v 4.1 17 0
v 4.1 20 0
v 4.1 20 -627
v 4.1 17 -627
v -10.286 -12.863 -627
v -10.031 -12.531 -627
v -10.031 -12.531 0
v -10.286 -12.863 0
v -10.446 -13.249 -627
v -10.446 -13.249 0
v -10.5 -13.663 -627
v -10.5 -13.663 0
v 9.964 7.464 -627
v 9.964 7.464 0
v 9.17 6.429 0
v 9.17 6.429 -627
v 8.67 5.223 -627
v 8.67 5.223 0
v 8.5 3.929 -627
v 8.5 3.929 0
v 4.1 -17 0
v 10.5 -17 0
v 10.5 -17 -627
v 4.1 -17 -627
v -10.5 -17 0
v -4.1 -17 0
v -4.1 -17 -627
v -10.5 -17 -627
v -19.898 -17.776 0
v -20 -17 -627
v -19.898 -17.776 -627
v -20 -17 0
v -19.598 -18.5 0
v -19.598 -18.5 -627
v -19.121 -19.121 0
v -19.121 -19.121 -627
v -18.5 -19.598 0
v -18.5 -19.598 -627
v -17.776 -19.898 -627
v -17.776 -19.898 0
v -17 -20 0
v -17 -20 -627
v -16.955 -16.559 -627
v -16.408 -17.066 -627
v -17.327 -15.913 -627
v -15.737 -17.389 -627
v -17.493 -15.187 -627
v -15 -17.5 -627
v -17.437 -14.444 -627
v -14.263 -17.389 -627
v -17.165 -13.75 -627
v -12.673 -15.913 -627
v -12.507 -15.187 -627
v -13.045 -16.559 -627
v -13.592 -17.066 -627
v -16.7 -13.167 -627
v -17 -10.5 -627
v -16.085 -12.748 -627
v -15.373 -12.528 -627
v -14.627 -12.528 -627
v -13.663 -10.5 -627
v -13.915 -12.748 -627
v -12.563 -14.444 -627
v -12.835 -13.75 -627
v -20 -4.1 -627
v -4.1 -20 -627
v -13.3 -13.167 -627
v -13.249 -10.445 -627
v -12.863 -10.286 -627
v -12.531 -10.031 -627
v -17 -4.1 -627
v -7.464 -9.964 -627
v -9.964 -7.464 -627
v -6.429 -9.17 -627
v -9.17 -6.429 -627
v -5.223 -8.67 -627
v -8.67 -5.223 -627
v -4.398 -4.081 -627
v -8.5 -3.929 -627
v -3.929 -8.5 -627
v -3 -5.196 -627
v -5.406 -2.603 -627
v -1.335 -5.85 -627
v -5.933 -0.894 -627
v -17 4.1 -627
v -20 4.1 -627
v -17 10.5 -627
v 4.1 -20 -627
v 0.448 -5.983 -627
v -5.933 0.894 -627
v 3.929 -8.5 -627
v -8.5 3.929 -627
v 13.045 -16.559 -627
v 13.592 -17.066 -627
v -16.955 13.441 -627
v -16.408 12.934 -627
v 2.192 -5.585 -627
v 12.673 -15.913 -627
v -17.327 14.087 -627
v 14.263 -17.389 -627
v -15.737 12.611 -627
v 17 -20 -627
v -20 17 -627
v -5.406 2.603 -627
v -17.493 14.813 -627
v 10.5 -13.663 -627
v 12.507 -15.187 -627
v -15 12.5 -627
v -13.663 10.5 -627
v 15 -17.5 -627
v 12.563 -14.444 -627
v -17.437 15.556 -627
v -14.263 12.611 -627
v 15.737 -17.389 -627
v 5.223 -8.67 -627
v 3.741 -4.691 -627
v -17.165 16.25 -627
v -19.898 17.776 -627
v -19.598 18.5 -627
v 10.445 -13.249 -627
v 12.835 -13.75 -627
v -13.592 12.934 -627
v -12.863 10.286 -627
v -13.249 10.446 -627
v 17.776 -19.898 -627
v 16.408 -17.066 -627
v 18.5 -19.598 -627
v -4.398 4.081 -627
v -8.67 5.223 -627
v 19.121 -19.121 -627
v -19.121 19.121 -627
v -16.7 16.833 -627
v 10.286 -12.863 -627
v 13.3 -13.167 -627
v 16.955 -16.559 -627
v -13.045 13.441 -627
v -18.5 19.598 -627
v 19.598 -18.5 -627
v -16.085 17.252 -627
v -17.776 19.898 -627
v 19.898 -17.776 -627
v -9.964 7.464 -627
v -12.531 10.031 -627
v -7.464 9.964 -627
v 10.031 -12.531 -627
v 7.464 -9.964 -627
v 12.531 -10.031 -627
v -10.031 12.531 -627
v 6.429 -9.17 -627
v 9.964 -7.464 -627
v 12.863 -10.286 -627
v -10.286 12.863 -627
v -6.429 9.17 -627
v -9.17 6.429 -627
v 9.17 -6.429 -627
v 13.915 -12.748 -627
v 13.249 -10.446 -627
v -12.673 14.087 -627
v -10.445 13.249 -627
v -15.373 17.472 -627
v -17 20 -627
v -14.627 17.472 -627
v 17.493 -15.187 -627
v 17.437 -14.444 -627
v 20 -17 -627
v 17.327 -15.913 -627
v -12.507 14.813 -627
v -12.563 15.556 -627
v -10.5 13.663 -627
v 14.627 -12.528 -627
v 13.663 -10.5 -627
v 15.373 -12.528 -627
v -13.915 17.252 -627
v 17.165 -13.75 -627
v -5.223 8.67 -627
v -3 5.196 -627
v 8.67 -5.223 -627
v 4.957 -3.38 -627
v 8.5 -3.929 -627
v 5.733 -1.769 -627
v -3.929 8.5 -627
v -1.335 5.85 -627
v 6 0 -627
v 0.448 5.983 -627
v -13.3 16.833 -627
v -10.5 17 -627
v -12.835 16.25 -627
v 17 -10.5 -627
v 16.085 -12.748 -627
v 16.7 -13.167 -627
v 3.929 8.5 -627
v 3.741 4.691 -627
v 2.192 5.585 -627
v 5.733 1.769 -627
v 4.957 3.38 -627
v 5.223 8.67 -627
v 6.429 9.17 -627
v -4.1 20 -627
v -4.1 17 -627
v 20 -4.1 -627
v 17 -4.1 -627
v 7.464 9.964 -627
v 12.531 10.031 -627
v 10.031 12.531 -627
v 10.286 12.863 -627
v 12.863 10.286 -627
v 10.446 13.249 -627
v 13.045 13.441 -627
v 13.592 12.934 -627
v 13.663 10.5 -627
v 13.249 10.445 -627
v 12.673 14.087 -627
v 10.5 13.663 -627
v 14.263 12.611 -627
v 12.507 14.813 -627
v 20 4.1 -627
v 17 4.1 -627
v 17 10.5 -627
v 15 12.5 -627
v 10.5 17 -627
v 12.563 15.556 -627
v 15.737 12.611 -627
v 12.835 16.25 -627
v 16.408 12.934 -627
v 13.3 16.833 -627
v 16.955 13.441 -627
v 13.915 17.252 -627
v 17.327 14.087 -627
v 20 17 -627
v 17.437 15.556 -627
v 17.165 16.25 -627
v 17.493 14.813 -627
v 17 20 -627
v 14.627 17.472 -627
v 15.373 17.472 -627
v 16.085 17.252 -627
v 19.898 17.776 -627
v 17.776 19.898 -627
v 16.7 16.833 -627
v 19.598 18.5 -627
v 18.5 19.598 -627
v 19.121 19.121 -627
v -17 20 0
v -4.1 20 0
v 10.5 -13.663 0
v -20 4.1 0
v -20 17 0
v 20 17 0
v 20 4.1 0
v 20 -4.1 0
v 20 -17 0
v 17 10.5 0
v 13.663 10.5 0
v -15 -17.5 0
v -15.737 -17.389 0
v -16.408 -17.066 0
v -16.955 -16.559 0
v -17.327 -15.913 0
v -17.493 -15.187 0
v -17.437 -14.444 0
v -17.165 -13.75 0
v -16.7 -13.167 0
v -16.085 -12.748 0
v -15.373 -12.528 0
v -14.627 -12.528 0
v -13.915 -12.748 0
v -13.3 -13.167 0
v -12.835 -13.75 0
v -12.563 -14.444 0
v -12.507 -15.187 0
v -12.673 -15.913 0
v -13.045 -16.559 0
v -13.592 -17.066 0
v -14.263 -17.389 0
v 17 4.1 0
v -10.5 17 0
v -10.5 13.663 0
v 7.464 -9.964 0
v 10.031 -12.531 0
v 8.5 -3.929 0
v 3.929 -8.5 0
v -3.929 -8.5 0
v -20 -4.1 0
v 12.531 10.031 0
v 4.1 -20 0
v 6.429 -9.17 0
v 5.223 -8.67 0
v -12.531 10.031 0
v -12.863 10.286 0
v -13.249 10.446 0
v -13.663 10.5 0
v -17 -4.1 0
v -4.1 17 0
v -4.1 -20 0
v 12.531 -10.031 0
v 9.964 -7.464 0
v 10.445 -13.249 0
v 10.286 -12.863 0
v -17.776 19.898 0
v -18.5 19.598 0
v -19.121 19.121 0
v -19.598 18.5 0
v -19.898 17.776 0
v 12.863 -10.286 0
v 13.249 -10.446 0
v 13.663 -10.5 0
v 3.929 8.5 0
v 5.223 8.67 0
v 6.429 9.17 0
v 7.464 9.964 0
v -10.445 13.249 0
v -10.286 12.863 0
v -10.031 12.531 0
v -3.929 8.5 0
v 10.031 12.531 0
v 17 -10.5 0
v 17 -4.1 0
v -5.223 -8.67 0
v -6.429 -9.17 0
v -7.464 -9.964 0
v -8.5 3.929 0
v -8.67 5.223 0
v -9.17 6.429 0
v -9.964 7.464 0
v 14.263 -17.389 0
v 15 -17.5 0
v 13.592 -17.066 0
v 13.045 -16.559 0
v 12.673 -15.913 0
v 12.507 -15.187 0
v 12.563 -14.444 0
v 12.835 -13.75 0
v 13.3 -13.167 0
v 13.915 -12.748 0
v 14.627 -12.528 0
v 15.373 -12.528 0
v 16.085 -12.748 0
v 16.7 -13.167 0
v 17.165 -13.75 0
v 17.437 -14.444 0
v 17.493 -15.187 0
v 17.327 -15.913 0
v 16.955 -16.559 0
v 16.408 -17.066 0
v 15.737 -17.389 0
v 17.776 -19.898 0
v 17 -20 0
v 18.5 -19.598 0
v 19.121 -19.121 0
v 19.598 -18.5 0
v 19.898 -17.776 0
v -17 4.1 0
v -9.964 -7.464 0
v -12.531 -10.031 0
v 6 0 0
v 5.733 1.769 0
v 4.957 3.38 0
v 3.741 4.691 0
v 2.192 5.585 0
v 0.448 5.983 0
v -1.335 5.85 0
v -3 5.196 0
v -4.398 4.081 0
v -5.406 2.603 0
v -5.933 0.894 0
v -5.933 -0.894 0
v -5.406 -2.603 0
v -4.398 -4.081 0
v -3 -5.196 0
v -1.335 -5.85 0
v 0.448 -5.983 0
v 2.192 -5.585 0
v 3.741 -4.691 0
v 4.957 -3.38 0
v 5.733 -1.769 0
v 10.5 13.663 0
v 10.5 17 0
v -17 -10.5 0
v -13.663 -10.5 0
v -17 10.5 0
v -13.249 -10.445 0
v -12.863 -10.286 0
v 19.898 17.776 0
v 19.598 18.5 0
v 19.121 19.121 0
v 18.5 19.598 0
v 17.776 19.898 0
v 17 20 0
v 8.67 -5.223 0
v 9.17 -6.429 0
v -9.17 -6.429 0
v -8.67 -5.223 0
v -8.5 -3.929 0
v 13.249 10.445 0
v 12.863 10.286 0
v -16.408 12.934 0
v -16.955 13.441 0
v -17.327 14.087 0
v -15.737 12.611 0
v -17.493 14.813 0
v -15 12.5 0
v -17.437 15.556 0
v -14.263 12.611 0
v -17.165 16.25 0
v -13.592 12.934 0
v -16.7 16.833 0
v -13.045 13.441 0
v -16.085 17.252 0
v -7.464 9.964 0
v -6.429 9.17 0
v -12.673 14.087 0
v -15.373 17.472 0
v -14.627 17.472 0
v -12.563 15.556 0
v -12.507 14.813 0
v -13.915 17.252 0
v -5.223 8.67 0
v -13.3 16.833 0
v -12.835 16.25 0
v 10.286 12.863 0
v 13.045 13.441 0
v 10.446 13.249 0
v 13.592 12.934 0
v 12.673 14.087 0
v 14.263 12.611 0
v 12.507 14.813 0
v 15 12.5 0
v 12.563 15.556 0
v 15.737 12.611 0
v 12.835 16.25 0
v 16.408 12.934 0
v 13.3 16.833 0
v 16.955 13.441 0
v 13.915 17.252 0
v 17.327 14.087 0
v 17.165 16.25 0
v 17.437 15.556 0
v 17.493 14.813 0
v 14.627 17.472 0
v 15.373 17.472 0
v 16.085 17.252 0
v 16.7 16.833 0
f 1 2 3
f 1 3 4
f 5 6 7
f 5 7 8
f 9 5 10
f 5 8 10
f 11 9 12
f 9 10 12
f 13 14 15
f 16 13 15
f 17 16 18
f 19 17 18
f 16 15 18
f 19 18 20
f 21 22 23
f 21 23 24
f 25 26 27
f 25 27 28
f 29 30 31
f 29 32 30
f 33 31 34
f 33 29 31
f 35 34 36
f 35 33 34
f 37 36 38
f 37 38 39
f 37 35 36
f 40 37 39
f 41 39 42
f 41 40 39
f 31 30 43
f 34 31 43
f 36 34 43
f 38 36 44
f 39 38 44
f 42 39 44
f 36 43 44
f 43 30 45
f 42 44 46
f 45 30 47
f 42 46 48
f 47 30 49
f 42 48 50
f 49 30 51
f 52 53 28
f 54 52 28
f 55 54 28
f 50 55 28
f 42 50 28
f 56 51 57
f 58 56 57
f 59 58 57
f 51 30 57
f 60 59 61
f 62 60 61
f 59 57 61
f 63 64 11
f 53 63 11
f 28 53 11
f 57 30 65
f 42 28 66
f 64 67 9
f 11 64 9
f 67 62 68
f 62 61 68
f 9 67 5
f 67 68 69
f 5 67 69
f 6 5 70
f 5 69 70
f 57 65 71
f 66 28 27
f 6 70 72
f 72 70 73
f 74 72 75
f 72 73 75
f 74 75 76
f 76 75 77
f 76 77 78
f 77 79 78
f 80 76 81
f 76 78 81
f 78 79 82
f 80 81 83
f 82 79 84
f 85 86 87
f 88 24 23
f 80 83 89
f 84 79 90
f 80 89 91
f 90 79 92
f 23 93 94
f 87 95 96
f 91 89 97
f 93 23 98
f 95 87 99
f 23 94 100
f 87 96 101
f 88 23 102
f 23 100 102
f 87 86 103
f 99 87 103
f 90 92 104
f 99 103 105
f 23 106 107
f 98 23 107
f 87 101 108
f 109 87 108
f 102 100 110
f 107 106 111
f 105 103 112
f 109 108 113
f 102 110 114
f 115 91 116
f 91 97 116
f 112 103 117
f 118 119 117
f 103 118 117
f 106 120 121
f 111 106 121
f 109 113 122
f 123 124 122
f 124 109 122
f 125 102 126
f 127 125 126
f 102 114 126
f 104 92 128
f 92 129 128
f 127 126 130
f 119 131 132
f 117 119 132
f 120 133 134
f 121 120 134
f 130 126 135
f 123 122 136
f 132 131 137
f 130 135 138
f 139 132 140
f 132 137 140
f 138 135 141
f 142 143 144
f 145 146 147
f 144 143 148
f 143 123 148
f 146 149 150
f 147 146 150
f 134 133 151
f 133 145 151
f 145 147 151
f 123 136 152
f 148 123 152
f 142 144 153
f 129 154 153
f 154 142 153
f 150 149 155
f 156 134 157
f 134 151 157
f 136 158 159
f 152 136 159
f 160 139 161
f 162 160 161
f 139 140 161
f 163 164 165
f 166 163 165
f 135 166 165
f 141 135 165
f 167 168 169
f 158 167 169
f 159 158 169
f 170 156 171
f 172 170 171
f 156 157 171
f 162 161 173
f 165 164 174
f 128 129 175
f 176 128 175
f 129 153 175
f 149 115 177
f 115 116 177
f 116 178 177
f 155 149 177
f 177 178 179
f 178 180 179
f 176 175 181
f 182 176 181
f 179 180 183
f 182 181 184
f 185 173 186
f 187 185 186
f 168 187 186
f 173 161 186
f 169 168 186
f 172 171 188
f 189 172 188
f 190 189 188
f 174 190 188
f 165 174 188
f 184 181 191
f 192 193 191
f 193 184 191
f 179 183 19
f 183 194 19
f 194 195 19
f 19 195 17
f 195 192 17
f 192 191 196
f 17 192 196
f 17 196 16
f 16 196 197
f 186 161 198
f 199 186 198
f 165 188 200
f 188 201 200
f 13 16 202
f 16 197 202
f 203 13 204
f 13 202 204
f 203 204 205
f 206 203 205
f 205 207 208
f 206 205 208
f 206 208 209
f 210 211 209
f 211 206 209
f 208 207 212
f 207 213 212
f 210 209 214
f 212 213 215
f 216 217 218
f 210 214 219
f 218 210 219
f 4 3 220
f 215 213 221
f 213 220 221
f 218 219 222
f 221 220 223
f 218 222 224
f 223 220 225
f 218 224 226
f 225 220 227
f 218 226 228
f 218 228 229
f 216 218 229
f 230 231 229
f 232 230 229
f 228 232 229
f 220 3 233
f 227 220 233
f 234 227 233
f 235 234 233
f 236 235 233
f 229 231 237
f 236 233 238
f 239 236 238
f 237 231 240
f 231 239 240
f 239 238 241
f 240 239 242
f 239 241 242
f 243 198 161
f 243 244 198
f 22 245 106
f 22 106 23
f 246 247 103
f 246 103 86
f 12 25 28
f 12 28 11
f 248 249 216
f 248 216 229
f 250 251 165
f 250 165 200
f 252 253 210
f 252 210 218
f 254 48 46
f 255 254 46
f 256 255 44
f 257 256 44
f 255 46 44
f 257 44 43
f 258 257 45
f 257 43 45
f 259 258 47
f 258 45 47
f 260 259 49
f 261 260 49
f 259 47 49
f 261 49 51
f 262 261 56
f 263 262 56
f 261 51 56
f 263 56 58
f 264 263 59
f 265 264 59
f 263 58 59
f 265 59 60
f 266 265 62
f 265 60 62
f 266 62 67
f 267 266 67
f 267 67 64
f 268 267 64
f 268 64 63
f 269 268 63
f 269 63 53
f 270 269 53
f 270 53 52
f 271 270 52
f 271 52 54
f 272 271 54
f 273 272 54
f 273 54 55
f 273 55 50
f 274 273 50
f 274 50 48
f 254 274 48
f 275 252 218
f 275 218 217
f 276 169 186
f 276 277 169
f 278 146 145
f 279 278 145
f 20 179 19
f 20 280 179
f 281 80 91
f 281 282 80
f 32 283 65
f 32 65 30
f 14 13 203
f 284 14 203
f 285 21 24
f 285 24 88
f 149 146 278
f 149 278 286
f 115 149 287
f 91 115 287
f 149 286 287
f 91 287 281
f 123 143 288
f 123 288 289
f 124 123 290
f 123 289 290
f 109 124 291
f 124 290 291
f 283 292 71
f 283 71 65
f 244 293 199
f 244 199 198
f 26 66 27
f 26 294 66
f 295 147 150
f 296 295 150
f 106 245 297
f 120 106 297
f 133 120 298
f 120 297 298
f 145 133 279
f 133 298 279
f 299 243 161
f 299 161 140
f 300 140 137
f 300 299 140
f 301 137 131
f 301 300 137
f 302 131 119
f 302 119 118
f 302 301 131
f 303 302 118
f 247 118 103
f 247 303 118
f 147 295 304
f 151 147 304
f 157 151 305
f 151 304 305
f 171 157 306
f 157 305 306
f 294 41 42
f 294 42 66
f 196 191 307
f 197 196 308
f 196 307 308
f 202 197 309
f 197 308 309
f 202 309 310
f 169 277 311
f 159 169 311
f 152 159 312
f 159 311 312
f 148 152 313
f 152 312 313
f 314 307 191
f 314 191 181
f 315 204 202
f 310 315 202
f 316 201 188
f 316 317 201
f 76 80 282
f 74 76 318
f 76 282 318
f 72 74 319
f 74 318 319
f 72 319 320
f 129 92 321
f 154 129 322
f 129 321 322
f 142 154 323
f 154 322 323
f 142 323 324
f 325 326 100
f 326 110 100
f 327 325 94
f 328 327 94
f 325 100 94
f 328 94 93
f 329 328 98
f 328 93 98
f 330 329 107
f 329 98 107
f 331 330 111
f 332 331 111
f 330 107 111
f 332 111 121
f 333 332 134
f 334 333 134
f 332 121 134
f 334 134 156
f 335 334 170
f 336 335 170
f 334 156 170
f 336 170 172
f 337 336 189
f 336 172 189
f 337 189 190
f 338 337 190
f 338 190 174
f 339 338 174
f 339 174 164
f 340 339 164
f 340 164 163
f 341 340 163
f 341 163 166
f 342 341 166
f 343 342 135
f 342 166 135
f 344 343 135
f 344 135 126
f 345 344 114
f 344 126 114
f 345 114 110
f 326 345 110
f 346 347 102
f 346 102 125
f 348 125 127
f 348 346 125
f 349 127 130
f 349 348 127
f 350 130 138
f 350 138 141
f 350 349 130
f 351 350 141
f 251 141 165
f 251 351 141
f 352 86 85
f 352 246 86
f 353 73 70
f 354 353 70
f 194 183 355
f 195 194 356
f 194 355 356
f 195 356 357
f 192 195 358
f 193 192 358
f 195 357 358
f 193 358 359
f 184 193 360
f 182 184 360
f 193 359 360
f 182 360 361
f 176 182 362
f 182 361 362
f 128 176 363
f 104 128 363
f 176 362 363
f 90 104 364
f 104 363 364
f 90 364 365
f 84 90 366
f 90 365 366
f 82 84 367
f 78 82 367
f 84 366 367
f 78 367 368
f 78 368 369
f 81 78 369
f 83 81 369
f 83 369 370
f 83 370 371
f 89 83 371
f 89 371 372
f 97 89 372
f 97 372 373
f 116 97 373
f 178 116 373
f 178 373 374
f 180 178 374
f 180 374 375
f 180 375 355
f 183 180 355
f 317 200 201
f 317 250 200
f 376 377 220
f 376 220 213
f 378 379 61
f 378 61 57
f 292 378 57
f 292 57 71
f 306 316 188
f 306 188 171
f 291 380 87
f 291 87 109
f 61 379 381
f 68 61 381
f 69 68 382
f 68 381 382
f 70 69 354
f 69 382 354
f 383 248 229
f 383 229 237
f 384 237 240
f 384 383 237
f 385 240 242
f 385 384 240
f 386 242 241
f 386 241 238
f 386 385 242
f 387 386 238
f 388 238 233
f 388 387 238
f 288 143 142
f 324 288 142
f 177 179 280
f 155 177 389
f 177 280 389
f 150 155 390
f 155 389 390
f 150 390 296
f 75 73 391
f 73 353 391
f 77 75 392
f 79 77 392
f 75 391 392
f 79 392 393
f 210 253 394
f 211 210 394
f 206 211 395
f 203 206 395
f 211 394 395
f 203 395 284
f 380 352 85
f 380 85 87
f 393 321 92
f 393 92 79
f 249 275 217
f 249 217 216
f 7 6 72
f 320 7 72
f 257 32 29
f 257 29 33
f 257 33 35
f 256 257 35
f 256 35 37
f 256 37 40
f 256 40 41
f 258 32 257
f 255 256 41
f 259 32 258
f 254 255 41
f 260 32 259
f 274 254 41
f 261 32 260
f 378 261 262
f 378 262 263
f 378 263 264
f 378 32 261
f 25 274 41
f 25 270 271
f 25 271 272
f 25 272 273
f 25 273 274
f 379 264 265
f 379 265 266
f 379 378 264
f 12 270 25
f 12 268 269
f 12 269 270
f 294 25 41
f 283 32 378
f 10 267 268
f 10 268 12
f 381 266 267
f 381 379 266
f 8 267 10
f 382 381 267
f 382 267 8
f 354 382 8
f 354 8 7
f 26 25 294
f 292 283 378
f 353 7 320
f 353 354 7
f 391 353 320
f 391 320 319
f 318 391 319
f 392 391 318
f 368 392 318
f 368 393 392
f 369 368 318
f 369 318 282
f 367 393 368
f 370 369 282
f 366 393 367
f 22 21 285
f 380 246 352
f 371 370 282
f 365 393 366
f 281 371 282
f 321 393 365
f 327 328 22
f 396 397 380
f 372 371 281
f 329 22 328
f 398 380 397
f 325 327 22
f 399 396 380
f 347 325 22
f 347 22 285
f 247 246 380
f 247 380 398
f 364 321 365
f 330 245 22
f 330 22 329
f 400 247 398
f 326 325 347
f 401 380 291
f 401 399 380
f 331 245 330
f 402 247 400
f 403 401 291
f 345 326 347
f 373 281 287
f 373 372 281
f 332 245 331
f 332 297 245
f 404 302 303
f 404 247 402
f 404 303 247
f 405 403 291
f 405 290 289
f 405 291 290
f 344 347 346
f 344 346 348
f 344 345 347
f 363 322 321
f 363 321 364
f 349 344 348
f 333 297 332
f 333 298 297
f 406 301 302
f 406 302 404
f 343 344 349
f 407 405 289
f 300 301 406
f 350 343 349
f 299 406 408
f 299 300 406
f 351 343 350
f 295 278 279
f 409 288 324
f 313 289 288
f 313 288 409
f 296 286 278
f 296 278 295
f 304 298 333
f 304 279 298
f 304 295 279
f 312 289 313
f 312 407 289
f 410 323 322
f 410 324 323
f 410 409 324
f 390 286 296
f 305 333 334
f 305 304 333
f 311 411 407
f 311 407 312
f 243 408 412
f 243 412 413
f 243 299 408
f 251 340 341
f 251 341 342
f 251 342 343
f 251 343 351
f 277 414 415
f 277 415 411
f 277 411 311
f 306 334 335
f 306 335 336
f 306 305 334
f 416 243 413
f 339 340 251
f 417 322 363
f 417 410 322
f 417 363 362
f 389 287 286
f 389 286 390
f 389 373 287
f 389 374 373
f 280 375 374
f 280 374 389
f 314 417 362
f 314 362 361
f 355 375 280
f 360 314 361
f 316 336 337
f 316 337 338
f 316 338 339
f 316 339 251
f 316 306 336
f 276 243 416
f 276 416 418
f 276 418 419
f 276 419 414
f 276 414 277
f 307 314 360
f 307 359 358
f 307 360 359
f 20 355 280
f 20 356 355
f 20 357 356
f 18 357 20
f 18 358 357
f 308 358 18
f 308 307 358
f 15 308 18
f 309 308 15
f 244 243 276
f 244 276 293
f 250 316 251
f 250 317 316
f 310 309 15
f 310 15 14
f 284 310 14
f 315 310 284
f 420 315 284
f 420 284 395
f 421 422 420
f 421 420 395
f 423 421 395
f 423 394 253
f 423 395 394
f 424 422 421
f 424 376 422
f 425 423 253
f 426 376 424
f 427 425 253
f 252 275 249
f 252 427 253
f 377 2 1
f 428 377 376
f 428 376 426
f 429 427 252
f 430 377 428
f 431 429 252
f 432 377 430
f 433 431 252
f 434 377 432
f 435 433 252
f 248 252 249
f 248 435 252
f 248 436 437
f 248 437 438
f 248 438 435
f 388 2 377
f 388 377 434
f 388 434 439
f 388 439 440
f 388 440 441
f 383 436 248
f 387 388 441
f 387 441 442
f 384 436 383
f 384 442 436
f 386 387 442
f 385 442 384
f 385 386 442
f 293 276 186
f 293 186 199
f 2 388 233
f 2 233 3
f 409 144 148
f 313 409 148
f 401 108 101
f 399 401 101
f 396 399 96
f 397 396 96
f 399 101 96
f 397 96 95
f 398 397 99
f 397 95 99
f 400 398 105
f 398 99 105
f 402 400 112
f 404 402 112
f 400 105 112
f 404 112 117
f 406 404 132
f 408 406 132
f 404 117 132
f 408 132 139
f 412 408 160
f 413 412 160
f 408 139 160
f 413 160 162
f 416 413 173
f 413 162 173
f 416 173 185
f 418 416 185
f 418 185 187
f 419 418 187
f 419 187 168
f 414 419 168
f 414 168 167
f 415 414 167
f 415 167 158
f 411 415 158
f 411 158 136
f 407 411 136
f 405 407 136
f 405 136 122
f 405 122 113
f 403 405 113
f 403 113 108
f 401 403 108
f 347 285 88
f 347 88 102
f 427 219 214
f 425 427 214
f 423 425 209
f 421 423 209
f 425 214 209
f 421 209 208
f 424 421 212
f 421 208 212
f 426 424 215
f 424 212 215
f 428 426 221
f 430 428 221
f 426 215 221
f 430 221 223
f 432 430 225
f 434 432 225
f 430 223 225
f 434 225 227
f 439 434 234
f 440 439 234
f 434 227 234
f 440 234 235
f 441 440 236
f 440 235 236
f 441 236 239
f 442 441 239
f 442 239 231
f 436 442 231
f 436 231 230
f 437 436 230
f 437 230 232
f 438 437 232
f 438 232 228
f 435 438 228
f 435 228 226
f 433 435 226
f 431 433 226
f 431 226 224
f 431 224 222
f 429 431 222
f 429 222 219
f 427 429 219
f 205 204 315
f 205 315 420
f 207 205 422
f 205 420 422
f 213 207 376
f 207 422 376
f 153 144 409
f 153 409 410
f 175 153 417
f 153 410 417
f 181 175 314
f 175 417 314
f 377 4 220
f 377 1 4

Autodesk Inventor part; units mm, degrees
sketch "Skizze_1" plane through (0, 0, 0) normal (0, 0, 1) x (1, 0, 0)
  arc A0 (-20, -17) -> (-17, -20) centre (-17, -17) ccw
  line L0 (-17, -20) -> (-4.1, -20)
  line L1 (-4.1, -20) -> (-4.1, -17)
  line L2 (-4.1, -17) -> (-10.5, -17)
  line L3 (-10.5, -17) -> (-10.5, -13.6627)
  arc A1 (-10.0314, -12.5314) -> (-10.5, -13.6627) centre (-8.9002, -13.6627) ccw
  line L4 (-10.0314, -12.5314) -> (-7.4645, -9.9645)
  arc A2 (-3.9289, -8.5) -> (-7.4645, -9.9645) centre (-3.9289, -13.5) ccw
  line L5 (-3.9289, -8.5) -> (3.9289, -8.5)
  arc A3 (7.4645, -9.9645) -> (3.9289, -8.5) centre (3.9289, -13.5) ccw
  line L6 (7.4645, -9.9645) -> (10.0314, -12.5314)
  arc A4 (10.5, -13.6627) -> (10.0314, -12.5314) centre (8.9002, -13.6627) ccw
  line L7 (10.5, -13.6627) -> (10.5, -17)
  line L8 (10.5, -17) -> (4.1, -17)
  line L9 (4.1, -17) -> (4.1, -20)
  line L10 (4.1, -20) -> (17, -20)
  arc A5 (17, -20) -> (20, -17) centre (17, -17) ccw
  line L11 (20, -17) -> (20, -4.1)
  line L12 (20, -4.1) -> (17, -4.1)
  line L13 (17, -4.1) -> (17, -10.5)
  line L14 (17, -10.5) -> (13.6627, -10.5)
  arc A6 (12.5314, -10.0314) -> (13.6627, -10.5) centre (13.6627, -8.9002) ccw
  line L15 (12.5314, -10.0314) -> (9.9645, -7.4645)
  arc A7 (8.5, -3.9289) -> (9.9645, -7.4645) centre (13.5, -3.9289) ccw
  line L16 (8.5, -3.9289) -> (8.5, 3.9289)
  arc A8 (9.9645, 7.4645) -> (8.5, 3.9289) centre (13.5, 3.9289) ccw
  line L17 (9.9645, 7.4645) -> (12.5314, 10.0314)
  arc A9 (13.6627, 10.5) -> (12.5314, 10.0314) centre (13.6627, 8.9002) ccw
  line L18 (13.6627, 10.5) -> (17, 10.5)
  line L19 (17, 10.5) -> (17, 4.1)
  line L20 (17, 4.1) -> (20, 4.1)
  line L21 (20, 4.1) -> (20, 17)
  arc A10 (20, 17) -> (17, 20) centre (17, 17) ccw
  line L22 (17, 20) -> (4.1, 20)
  line L23 (4.1, 20) -> (4.1, 17)
  line L24 (4.1, 17) -> (10.5, 17)
  line L25 (10.5, 17) -> (10.5, 13.6627)
  arc A11 (10.0314, 12.5314) -> (10.5, 13.6627) centre (8.9002, 13.6627) ccw
  line L26 (10.0314, 12.5314) -> (7.4645, 9.9645)
  arc A12 (3.9289, 8.5) -> (7.4645, 9.9645) centre (3.9289, 13.5) ccw
  line L27 (3.9289, 8.5) -> (-3.9289, 8.5)
  arc A13 (-7.4645, 9.9645) -> (-3.9289, 8.5) centre (-3.9289, 13.5) ccw
  line L28 (-7.4645, 9.9645) -> (-10.0314, 12.5314)
  arc A14 (-10.5, 13.6627) -> (-10.0314, 12.5314) centre (-8.9002, 13.6627) ccw
  line L29 (-10.5, 13.6627) -> (-10.5, 17)
  line L30 (-10.5, 17) -> (-4.1, 17)
  line L31 (-4.1, 17) -> (-4.1, 20)
  line L32 (-4.1, 20) -> (-17, 20)
  arc A15 (-17, 20) -> (-20, 17) centre (-17, 17) ccw
  line L33 (-20, 17) -> (-20, 4.1)
  line L34 (-20, 4.1) -> (-17, 4.1)
  line L35 (-17, 4.1) -> (-17, 10.5)
  line L36 (-17, 10.5) -> (-13.6627, 10.5)
  arc A16 (-12.5314, 10.0314) -> (-13.6627, 10.5) centre (-13.6627, 8.9002) ccw
  line L37 (-12.5314, 10.0314) -> (-9.9645, 7.4645)
  arc A17 (-8.5, 3.9289) -> (-9.9645, 7.4645) centre (-13.5, 3.9289) ccw
  line L38 (-8.5, 3.9289) -> (-8.5, -3.9289)
  arc A18 (-9.9645, -7.4645) -> (-8.5, -3.9289) centre (-13.5, -3.9289) ccw
  line L39 (-9.9645, -7.4645) -> (-12.5314, -10.0314)
  arc A19 (-13.6627, -10.5) -> (-12.5314, -10.0314) centre (-13.6627, -8.9002) ccw
  line L40 (-13.6627, -10.5) -> (-17, -10.5)
  line L41 (-17, -10.5) -> (-17, -4.1)
  line L42 (-17, -4.1) -> (-20, -4.1)
  line L43 (-20, -4.1) -> (-20, -17)
  circle A20 centre (0, 0) radius 6
extrude "Extrusion1" add sketch "Skizze_1" against normal blind 627
sketch "Sketch2" plane through (0, 0, 0) normal (0, 0, 1) x (1, 0, 0)
  point P0 (-15, -15)
hole "Drilling 1" at (-15, -15, 0) direction (0, 0, -1) diameter 5 depth 6000
sketch "Sketch3" plane through (0, 0, 0) normal (0, 0, 1) x (1, 0, 0)
  point P0 (15, -15)
hole "Drilling 2" at (15, -15, 0) direction (0, 0, -1) diameter 5 depth 6000
sketch "Sketch4" plane through (0, 0, 0) normal (0, 0, 1) x (1, 0, 0)
  point P0 (15, 15)
hole "Drilling 3" at (15, 15, 0) direction (0, 0, -1) diameter 5 depth 6000
sketch "Sketch5" plane through (0, 0, 0) normal (0, 0, 1) x (1, 0, 0)
  point P0 (-15, 15)
hole "Drilling 4" at (-15, 15, 0) direction (0, 0, -1) diameter 5 depth 6000
ref_plane "side_4d_XY" through (-20, 0, -313.5) normal (-1, 0, 0) x (0, 1, 0)
ref_plane "side_4d_YZ" through (-20, 0, -313.5) normal (0, 1, 0) x (0, 0, -1)
ref_plane "side_4d_ZX" through (-20, 0, -313.5) normal (0, 0, -1) x (-1, 0, 0)
ref_plane "side_1a_XY" through (0, 20, -313.5) normal (0, 1, 0) x (1, 0, 0)
ref_plane "side_1a_YZ" through (0, 20, -313.5) normal (1, 0, 0) x (0, 0, -1)
ref_plane "side_1a_ZX" through (0, 20, -313.5) normal (0, 0, -1) x (0, 1, 0)
ref_plane "side_2b_XY" through (20, 0, -313.5) normal (1, 0, 0) x (0, -1, 0)
ref_plane "side_2b_YZ" through (20, 0, -313.5) normal (0, -1, 0) x (0, 0, -1)
ref_plane "side_2b_ZX" through (20, 0, -313.5) normal (0, 0, -1) x (1, 0, 0)
ref_plane "side_3c_XY" through (0, -20, -313.5) normal (0, -1, 0) x (-1, 0, 0)
ref_plane "side_3c_YZ" through (0, -20, -313.5) normal (-1, 0, 0) x (0, 0, -1)
ref_plane "side_3c_ZX" through (0, -20, -313.5) normal (0, 0, -1) x (0, -1, 0)
ref_plane "end_XY" through (0, 0, -627) normal (0, 0, -1) x (1, 0, 0)
ref_plane "end_YZ" through (0, 0, -627) normal (1, 0, 0) x (0, -1, 0)
ref_plane "end_ZX" through (0, 0, -627) normal (0, -1, 0) x (0, 0, -1)
ref_plane "start_XY" through (0, 0, 0) normal (0, 0, 1) x (1, 0, 0)
ref_plane "start_YZ" through (0, 0, 0) normal (1, 0, 0) x (0, 1, 0)
ref_plane "start_ZX" through (0, 0, 0) normal (0, 1, 0) x (0, 0, 1)
properties part number "MayTec 1.11.040040.43S_Profile 40x40, 4E, S_627_Detail_(0;0,0,0)"
